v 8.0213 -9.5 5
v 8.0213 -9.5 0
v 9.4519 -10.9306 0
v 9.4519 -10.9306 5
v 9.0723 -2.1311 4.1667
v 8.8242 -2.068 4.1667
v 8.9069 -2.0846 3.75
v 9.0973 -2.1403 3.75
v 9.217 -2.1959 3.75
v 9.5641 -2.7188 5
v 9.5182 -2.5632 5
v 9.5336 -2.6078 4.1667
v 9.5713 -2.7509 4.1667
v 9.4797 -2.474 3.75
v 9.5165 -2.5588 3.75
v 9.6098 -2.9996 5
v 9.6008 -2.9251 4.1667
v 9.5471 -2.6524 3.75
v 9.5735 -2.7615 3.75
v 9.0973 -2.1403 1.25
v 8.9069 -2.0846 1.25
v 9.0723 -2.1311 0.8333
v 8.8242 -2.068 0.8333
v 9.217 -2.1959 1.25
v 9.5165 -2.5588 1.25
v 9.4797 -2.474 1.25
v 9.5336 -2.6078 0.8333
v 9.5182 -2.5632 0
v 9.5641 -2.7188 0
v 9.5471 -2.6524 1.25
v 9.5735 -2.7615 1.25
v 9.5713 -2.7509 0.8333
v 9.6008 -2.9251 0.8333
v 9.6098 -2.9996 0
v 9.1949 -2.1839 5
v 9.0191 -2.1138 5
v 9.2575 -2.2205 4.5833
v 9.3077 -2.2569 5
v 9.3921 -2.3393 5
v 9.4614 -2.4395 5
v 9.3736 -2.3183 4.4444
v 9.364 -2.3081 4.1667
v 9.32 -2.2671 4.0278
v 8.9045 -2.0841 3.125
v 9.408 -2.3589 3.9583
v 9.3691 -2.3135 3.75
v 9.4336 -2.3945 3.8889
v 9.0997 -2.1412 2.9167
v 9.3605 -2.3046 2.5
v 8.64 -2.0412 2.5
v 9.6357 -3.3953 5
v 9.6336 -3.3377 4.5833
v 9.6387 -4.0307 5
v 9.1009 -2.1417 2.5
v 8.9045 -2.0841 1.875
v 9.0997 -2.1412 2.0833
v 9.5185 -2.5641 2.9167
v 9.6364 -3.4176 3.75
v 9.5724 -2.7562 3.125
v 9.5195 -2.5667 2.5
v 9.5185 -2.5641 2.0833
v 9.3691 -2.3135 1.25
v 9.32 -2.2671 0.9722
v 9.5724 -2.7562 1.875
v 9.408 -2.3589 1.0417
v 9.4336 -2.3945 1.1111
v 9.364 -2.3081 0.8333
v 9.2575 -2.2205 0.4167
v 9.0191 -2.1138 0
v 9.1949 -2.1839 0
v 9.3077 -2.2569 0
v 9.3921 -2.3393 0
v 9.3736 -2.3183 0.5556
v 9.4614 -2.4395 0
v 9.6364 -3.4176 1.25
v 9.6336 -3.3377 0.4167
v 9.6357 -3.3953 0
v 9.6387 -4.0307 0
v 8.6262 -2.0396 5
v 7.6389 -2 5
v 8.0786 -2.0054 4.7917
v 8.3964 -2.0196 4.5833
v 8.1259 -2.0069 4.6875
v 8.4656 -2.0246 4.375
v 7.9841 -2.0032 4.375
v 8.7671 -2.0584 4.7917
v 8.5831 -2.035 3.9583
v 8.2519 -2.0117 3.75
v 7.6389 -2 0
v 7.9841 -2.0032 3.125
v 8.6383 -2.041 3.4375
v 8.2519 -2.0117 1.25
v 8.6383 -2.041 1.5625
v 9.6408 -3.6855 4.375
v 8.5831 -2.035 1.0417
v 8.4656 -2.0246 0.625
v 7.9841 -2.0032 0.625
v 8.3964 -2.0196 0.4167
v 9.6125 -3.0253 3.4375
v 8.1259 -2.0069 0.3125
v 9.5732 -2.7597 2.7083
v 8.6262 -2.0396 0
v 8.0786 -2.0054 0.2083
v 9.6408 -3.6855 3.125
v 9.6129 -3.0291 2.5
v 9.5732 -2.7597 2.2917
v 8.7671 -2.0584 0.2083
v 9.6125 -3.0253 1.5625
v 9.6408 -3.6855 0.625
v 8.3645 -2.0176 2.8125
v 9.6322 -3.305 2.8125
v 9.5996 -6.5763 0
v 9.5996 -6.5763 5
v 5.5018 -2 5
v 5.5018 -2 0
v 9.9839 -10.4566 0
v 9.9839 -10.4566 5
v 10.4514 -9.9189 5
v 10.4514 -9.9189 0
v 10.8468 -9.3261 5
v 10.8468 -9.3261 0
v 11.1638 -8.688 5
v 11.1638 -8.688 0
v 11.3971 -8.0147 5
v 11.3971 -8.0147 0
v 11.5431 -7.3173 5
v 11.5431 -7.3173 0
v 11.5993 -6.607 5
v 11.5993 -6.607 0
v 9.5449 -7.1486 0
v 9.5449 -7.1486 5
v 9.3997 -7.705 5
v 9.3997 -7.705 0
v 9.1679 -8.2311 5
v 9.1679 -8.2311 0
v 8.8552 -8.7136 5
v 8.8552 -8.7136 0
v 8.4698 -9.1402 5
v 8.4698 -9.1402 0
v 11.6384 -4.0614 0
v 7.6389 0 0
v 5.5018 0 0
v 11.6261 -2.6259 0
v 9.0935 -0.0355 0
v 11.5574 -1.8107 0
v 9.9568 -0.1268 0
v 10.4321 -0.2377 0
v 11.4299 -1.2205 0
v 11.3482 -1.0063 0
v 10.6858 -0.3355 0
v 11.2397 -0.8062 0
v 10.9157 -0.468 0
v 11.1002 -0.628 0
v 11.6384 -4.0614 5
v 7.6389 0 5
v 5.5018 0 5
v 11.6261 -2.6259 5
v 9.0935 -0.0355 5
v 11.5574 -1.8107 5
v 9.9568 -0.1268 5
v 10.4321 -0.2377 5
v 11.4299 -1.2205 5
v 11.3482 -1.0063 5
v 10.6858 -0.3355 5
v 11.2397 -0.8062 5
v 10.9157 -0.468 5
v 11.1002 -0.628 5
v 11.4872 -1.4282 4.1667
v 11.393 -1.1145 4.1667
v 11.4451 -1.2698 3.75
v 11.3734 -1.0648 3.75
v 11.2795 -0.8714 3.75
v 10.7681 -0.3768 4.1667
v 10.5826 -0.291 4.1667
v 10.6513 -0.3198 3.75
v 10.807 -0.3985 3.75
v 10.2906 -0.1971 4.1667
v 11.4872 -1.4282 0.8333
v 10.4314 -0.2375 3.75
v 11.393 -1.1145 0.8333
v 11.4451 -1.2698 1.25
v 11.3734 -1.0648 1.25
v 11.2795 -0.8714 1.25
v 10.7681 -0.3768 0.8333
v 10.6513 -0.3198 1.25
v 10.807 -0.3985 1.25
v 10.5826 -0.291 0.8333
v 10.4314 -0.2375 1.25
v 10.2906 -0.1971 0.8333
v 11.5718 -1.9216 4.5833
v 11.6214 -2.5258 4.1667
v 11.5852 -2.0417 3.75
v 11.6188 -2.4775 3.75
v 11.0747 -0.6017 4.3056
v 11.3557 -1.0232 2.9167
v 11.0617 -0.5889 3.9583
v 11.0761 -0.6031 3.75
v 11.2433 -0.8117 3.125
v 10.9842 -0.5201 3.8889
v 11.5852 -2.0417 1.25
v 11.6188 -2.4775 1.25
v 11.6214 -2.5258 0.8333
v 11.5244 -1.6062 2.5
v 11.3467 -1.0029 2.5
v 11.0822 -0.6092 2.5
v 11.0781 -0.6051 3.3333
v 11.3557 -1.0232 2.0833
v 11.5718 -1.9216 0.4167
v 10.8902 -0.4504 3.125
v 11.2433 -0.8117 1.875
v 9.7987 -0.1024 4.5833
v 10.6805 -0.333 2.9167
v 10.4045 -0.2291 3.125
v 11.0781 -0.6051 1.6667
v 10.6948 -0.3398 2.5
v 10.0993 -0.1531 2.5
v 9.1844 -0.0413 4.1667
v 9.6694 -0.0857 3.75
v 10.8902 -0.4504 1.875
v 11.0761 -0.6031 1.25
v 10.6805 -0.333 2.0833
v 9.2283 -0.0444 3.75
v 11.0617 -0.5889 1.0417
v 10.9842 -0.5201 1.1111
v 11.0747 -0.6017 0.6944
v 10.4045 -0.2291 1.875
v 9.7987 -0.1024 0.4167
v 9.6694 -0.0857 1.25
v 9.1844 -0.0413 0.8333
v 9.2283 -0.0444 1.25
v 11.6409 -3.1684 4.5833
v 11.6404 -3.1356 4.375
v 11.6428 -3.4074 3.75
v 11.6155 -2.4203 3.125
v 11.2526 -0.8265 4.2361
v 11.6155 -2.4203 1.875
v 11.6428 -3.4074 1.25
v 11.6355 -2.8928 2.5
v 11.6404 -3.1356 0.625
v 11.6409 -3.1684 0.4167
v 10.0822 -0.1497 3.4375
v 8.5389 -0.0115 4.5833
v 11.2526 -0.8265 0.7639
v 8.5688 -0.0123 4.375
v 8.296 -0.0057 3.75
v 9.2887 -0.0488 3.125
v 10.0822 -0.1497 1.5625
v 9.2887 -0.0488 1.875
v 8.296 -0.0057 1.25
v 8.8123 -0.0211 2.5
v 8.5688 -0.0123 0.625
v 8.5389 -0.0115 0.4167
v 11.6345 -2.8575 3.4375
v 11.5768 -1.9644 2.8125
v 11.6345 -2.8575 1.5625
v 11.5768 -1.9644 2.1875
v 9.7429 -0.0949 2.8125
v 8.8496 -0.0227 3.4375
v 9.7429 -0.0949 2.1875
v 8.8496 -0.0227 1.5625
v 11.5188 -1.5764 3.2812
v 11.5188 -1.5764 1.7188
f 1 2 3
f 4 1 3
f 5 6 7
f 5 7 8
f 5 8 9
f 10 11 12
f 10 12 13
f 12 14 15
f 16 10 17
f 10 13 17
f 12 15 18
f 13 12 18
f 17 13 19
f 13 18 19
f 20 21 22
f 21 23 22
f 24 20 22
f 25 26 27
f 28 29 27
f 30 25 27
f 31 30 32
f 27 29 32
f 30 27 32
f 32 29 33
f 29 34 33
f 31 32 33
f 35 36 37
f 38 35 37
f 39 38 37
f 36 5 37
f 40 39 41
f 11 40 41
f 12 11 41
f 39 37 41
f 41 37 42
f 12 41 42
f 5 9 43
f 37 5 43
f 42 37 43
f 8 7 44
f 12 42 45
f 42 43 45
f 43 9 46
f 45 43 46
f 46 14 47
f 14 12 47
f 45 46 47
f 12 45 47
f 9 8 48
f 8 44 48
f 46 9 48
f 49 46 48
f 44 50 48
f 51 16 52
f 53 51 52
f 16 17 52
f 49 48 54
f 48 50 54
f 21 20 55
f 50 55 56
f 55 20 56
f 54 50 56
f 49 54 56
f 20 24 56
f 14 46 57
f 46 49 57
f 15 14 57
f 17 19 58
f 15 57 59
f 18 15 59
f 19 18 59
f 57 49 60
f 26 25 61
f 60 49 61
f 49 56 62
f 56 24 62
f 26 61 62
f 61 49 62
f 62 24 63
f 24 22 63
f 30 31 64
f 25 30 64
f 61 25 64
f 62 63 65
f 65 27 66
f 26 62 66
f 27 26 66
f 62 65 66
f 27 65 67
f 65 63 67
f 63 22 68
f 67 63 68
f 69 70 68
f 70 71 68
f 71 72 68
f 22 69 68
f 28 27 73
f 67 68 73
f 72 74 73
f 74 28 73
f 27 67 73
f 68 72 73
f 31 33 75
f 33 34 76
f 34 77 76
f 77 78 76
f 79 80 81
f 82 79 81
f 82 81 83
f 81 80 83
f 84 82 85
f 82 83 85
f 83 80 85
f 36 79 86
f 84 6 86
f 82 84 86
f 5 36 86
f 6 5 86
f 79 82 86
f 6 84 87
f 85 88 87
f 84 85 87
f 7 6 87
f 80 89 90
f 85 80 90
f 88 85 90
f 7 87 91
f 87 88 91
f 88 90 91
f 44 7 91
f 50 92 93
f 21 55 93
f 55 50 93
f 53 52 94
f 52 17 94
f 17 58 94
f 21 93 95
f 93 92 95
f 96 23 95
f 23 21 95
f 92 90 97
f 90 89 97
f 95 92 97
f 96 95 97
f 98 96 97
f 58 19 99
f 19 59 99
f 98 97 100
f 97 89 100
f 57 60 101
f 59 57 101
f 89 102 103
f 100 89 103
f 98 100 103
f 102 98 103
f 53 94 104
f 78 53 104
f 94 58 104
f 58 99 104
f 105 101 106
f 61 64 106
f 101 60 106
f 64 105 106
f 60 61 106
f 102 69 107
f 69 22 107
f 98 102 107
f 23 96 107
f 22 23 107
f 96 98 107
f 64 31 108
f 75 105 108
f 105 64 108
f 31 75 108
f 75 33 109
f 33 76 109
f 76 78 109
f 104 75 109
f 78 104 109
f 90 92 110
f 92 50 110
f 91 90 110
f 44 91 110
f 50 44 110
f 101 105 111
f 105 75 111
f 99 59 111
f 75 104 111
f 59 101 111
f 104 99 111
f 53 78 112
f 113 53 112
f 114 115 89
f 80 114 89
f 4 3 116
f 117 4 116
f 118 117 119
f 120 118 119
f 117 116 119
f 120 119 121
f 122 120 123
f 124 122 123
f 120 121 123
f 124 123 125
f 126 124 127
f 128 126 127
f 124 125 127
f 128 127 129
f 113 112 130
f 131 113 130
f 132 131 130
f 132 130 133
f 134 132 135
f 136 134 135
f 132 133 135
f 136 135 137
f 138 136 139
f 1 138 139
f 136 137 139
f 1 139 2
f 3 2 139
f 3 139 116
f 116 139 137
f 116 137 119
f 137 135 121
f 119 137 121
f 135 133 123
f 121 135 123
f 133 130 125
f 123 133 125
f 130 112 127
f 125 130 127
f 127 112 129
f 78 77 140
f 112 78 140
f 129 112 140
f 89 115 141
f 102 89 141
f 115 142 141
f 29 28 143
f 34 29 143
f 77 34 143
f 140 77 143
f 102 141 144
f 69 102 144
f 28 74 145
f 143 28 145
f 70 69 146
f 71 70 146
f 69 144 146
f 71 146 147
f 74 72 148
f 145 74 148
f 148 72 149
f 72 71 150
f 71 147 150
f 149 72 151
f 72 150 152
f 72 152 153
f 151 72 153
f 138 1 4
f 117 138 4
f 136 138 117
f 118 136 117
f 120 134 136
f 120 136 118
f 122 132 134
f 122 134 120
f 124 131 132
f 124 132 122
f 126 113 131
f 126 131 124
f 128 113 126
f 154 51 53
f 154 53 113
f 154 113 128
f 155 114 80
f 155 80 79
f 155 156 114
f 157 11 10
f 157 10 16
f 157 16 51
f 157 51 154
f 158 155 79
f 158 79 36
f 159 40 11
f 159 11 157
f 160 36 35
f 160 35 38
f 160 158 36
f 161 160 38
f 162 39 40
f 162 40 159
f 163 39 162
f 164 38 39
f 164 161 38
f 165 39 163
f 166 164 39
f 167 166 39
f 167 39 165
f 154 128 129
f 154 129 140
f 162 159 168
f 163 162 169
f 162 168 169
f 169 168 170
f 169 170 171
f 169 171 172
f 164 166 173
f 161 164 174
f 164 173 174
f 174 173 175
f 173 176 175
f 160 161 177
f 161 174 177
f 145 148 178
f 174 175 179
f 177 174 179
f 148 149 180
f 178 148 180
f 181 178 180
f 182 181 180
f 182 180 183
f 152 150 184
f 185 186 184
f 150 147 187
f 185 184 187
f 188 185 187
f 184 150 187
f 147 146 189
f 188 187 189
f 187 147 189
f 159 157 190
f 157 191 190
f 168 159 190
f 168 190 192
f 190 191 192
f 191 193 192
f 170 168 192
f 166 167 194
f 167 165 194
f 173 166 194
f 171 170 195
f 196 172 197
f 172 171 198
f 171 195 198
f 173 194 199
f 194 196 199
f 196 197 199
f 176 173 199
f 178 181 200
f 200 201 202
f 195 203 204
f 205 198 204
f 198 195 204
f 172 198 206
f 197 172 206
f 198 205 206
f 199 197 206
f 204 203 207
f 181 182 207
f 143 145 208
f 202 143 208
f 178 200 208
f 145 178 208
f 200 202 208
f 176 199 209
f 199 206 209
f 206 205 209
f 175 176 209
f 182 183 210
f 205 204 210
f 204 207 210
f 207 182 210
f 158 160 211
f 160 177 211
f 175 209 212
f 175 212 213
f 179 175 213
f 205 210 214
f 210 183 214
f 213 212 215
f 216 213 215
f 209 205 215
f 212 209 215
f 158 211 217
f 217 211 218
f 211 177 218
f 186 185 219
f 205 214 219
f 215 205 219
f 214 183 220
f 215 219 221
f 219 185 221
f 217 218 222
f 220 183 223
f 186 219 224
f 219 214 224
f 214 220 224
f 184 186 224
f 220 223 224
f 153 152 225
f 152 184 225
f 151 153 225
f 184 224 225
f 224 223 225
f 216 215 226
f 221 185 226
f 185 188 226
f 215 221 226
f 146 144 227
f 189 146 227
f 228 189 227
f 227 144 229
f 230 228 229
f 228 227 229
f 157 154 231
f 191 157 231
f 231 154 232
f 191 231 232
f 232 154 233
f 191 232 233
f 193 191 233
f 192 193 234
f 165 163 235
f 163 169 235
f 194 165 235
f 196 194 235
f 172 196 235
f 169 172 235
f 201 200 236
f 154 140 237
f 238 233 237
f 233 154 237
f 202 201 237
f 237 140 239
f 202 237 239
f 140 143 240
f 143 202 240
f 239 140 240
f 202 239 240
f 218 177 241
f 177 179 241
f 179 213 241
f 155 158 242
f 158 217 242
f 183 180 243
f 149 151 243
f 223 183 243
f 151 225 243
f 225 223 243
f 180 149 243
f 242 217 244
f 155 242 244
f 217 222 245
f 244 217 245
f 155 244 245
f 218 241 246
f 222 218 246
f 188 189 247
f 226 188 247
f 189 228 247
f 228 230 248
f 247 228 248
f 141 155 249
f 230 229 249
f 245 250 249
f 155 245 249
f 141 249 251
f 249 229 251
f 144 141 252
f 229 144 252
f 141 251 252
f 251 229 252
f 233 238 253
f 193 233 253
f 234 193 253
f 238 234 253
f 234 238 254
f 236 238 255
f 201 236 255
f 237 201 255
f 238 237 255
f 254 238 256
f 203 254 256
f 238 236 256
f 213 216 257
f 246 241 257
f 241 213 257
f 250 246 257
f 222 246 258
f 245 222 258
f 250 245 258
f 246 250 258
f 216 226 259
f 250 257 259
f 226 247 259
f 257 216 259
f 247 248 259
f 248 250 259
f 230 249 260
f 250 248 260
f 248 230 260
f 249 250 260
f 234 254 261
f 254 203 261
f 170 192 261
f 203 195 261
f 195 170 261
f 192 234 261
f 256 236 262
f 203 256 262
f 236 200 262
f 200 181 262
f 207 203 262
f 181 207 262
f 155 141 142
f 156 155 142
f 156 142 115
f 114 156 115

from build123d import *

# Parameters (mm, degrees)
F3_DEPTH    = 5
F4_T1_DEPTH = 5
F5_T1_DEPTH = 25.3094755674


# Not quite as in the source:
# - a fillet or chamfer that OpenCascade refuses, or shapes differently, is made with other operations: its cross-section is extruded or revolved along the edge and cut away or added
# - a feature of the source that left no trace in its solid (it failed there, or was rolled back) is left out


with BuildPart() as f3:
    # F2 (on Top) → F3 (new body)
    with BuildSketch(Plane.XY):
        with BuildLine():
            Line((5.5017601699, 0), (5.5017601699, -2))
            Line((5.5017601699, -2), (9.6698484997, -2))
            Line((9.6698484997, -2), (9.5995756294, -6.5762830432))
            ThreePointArc((9.5995756294, -6.5762830432), (9.167895168, -8.2311078505), (8.0212889249, -9.5))
            Line((8.0212889249, -9.5), (9.4518866721, -10.9305977473))
            ThreePointArc((9.4518866721, -10.9305977473), (11.0154330705, -9.0120786534), (11.5993398679, -6.6069911903))
            Line((11.5993398679, -6.6069911903), (11.7007960564, 0))
            Line((11.7007960564, 0), (5.5017601699, 0))
        make_face()
    extrude(amount=F3_DEPTH)

    # F4: fillet of radius 2 on 1 edges, made by hand

    # F4_s2 → F4_t1 (join)
    with BuildSketch(Plane.XY):
        with BuildLine():
            add(Edge.make_bspline(
                [(7.638900943, -2), (9.6698484997, -2), (9.6386651815, -4.0307081471)],
                knots=[0, 0, 0, 1, 1, 1], degree=2, weights=[1, 2.3333333333, 1]))
            Line((9.6386651815, -4.0307081471), (9.6698484997, -2))
            Line((9.6698484997, -2), (7.638900943, -2))
        make_face()
    extrude(amount=F4_T1_DEPTH)

    # F5: fillet of radius 4 on 1 edges, made by hand

    # F5_s2 → F5_t1 (cut)
    with BuildSketch(Plane.XY.offset(-10.1547377837)):
        with BuildLine():
            add(Edge.make_bspline(
                [(11.63842942, -4.0614162943), (11.7007960564, 0), (7.638900943, 0)],
                knots=[0, 0, 0, 1, 1, 1], degree=2, weights=[1, 2.3333333333, 1]))
            Line((7.638900943, 0), (11.7007960564, 0))
            Line((11.7007960564, 0), (11.63842942, -4.0614162943))
        make_face()
    extrude(amount=F5_T1_DEPTH, mode=Mode.SUBTRACT)


solid = f3.part
